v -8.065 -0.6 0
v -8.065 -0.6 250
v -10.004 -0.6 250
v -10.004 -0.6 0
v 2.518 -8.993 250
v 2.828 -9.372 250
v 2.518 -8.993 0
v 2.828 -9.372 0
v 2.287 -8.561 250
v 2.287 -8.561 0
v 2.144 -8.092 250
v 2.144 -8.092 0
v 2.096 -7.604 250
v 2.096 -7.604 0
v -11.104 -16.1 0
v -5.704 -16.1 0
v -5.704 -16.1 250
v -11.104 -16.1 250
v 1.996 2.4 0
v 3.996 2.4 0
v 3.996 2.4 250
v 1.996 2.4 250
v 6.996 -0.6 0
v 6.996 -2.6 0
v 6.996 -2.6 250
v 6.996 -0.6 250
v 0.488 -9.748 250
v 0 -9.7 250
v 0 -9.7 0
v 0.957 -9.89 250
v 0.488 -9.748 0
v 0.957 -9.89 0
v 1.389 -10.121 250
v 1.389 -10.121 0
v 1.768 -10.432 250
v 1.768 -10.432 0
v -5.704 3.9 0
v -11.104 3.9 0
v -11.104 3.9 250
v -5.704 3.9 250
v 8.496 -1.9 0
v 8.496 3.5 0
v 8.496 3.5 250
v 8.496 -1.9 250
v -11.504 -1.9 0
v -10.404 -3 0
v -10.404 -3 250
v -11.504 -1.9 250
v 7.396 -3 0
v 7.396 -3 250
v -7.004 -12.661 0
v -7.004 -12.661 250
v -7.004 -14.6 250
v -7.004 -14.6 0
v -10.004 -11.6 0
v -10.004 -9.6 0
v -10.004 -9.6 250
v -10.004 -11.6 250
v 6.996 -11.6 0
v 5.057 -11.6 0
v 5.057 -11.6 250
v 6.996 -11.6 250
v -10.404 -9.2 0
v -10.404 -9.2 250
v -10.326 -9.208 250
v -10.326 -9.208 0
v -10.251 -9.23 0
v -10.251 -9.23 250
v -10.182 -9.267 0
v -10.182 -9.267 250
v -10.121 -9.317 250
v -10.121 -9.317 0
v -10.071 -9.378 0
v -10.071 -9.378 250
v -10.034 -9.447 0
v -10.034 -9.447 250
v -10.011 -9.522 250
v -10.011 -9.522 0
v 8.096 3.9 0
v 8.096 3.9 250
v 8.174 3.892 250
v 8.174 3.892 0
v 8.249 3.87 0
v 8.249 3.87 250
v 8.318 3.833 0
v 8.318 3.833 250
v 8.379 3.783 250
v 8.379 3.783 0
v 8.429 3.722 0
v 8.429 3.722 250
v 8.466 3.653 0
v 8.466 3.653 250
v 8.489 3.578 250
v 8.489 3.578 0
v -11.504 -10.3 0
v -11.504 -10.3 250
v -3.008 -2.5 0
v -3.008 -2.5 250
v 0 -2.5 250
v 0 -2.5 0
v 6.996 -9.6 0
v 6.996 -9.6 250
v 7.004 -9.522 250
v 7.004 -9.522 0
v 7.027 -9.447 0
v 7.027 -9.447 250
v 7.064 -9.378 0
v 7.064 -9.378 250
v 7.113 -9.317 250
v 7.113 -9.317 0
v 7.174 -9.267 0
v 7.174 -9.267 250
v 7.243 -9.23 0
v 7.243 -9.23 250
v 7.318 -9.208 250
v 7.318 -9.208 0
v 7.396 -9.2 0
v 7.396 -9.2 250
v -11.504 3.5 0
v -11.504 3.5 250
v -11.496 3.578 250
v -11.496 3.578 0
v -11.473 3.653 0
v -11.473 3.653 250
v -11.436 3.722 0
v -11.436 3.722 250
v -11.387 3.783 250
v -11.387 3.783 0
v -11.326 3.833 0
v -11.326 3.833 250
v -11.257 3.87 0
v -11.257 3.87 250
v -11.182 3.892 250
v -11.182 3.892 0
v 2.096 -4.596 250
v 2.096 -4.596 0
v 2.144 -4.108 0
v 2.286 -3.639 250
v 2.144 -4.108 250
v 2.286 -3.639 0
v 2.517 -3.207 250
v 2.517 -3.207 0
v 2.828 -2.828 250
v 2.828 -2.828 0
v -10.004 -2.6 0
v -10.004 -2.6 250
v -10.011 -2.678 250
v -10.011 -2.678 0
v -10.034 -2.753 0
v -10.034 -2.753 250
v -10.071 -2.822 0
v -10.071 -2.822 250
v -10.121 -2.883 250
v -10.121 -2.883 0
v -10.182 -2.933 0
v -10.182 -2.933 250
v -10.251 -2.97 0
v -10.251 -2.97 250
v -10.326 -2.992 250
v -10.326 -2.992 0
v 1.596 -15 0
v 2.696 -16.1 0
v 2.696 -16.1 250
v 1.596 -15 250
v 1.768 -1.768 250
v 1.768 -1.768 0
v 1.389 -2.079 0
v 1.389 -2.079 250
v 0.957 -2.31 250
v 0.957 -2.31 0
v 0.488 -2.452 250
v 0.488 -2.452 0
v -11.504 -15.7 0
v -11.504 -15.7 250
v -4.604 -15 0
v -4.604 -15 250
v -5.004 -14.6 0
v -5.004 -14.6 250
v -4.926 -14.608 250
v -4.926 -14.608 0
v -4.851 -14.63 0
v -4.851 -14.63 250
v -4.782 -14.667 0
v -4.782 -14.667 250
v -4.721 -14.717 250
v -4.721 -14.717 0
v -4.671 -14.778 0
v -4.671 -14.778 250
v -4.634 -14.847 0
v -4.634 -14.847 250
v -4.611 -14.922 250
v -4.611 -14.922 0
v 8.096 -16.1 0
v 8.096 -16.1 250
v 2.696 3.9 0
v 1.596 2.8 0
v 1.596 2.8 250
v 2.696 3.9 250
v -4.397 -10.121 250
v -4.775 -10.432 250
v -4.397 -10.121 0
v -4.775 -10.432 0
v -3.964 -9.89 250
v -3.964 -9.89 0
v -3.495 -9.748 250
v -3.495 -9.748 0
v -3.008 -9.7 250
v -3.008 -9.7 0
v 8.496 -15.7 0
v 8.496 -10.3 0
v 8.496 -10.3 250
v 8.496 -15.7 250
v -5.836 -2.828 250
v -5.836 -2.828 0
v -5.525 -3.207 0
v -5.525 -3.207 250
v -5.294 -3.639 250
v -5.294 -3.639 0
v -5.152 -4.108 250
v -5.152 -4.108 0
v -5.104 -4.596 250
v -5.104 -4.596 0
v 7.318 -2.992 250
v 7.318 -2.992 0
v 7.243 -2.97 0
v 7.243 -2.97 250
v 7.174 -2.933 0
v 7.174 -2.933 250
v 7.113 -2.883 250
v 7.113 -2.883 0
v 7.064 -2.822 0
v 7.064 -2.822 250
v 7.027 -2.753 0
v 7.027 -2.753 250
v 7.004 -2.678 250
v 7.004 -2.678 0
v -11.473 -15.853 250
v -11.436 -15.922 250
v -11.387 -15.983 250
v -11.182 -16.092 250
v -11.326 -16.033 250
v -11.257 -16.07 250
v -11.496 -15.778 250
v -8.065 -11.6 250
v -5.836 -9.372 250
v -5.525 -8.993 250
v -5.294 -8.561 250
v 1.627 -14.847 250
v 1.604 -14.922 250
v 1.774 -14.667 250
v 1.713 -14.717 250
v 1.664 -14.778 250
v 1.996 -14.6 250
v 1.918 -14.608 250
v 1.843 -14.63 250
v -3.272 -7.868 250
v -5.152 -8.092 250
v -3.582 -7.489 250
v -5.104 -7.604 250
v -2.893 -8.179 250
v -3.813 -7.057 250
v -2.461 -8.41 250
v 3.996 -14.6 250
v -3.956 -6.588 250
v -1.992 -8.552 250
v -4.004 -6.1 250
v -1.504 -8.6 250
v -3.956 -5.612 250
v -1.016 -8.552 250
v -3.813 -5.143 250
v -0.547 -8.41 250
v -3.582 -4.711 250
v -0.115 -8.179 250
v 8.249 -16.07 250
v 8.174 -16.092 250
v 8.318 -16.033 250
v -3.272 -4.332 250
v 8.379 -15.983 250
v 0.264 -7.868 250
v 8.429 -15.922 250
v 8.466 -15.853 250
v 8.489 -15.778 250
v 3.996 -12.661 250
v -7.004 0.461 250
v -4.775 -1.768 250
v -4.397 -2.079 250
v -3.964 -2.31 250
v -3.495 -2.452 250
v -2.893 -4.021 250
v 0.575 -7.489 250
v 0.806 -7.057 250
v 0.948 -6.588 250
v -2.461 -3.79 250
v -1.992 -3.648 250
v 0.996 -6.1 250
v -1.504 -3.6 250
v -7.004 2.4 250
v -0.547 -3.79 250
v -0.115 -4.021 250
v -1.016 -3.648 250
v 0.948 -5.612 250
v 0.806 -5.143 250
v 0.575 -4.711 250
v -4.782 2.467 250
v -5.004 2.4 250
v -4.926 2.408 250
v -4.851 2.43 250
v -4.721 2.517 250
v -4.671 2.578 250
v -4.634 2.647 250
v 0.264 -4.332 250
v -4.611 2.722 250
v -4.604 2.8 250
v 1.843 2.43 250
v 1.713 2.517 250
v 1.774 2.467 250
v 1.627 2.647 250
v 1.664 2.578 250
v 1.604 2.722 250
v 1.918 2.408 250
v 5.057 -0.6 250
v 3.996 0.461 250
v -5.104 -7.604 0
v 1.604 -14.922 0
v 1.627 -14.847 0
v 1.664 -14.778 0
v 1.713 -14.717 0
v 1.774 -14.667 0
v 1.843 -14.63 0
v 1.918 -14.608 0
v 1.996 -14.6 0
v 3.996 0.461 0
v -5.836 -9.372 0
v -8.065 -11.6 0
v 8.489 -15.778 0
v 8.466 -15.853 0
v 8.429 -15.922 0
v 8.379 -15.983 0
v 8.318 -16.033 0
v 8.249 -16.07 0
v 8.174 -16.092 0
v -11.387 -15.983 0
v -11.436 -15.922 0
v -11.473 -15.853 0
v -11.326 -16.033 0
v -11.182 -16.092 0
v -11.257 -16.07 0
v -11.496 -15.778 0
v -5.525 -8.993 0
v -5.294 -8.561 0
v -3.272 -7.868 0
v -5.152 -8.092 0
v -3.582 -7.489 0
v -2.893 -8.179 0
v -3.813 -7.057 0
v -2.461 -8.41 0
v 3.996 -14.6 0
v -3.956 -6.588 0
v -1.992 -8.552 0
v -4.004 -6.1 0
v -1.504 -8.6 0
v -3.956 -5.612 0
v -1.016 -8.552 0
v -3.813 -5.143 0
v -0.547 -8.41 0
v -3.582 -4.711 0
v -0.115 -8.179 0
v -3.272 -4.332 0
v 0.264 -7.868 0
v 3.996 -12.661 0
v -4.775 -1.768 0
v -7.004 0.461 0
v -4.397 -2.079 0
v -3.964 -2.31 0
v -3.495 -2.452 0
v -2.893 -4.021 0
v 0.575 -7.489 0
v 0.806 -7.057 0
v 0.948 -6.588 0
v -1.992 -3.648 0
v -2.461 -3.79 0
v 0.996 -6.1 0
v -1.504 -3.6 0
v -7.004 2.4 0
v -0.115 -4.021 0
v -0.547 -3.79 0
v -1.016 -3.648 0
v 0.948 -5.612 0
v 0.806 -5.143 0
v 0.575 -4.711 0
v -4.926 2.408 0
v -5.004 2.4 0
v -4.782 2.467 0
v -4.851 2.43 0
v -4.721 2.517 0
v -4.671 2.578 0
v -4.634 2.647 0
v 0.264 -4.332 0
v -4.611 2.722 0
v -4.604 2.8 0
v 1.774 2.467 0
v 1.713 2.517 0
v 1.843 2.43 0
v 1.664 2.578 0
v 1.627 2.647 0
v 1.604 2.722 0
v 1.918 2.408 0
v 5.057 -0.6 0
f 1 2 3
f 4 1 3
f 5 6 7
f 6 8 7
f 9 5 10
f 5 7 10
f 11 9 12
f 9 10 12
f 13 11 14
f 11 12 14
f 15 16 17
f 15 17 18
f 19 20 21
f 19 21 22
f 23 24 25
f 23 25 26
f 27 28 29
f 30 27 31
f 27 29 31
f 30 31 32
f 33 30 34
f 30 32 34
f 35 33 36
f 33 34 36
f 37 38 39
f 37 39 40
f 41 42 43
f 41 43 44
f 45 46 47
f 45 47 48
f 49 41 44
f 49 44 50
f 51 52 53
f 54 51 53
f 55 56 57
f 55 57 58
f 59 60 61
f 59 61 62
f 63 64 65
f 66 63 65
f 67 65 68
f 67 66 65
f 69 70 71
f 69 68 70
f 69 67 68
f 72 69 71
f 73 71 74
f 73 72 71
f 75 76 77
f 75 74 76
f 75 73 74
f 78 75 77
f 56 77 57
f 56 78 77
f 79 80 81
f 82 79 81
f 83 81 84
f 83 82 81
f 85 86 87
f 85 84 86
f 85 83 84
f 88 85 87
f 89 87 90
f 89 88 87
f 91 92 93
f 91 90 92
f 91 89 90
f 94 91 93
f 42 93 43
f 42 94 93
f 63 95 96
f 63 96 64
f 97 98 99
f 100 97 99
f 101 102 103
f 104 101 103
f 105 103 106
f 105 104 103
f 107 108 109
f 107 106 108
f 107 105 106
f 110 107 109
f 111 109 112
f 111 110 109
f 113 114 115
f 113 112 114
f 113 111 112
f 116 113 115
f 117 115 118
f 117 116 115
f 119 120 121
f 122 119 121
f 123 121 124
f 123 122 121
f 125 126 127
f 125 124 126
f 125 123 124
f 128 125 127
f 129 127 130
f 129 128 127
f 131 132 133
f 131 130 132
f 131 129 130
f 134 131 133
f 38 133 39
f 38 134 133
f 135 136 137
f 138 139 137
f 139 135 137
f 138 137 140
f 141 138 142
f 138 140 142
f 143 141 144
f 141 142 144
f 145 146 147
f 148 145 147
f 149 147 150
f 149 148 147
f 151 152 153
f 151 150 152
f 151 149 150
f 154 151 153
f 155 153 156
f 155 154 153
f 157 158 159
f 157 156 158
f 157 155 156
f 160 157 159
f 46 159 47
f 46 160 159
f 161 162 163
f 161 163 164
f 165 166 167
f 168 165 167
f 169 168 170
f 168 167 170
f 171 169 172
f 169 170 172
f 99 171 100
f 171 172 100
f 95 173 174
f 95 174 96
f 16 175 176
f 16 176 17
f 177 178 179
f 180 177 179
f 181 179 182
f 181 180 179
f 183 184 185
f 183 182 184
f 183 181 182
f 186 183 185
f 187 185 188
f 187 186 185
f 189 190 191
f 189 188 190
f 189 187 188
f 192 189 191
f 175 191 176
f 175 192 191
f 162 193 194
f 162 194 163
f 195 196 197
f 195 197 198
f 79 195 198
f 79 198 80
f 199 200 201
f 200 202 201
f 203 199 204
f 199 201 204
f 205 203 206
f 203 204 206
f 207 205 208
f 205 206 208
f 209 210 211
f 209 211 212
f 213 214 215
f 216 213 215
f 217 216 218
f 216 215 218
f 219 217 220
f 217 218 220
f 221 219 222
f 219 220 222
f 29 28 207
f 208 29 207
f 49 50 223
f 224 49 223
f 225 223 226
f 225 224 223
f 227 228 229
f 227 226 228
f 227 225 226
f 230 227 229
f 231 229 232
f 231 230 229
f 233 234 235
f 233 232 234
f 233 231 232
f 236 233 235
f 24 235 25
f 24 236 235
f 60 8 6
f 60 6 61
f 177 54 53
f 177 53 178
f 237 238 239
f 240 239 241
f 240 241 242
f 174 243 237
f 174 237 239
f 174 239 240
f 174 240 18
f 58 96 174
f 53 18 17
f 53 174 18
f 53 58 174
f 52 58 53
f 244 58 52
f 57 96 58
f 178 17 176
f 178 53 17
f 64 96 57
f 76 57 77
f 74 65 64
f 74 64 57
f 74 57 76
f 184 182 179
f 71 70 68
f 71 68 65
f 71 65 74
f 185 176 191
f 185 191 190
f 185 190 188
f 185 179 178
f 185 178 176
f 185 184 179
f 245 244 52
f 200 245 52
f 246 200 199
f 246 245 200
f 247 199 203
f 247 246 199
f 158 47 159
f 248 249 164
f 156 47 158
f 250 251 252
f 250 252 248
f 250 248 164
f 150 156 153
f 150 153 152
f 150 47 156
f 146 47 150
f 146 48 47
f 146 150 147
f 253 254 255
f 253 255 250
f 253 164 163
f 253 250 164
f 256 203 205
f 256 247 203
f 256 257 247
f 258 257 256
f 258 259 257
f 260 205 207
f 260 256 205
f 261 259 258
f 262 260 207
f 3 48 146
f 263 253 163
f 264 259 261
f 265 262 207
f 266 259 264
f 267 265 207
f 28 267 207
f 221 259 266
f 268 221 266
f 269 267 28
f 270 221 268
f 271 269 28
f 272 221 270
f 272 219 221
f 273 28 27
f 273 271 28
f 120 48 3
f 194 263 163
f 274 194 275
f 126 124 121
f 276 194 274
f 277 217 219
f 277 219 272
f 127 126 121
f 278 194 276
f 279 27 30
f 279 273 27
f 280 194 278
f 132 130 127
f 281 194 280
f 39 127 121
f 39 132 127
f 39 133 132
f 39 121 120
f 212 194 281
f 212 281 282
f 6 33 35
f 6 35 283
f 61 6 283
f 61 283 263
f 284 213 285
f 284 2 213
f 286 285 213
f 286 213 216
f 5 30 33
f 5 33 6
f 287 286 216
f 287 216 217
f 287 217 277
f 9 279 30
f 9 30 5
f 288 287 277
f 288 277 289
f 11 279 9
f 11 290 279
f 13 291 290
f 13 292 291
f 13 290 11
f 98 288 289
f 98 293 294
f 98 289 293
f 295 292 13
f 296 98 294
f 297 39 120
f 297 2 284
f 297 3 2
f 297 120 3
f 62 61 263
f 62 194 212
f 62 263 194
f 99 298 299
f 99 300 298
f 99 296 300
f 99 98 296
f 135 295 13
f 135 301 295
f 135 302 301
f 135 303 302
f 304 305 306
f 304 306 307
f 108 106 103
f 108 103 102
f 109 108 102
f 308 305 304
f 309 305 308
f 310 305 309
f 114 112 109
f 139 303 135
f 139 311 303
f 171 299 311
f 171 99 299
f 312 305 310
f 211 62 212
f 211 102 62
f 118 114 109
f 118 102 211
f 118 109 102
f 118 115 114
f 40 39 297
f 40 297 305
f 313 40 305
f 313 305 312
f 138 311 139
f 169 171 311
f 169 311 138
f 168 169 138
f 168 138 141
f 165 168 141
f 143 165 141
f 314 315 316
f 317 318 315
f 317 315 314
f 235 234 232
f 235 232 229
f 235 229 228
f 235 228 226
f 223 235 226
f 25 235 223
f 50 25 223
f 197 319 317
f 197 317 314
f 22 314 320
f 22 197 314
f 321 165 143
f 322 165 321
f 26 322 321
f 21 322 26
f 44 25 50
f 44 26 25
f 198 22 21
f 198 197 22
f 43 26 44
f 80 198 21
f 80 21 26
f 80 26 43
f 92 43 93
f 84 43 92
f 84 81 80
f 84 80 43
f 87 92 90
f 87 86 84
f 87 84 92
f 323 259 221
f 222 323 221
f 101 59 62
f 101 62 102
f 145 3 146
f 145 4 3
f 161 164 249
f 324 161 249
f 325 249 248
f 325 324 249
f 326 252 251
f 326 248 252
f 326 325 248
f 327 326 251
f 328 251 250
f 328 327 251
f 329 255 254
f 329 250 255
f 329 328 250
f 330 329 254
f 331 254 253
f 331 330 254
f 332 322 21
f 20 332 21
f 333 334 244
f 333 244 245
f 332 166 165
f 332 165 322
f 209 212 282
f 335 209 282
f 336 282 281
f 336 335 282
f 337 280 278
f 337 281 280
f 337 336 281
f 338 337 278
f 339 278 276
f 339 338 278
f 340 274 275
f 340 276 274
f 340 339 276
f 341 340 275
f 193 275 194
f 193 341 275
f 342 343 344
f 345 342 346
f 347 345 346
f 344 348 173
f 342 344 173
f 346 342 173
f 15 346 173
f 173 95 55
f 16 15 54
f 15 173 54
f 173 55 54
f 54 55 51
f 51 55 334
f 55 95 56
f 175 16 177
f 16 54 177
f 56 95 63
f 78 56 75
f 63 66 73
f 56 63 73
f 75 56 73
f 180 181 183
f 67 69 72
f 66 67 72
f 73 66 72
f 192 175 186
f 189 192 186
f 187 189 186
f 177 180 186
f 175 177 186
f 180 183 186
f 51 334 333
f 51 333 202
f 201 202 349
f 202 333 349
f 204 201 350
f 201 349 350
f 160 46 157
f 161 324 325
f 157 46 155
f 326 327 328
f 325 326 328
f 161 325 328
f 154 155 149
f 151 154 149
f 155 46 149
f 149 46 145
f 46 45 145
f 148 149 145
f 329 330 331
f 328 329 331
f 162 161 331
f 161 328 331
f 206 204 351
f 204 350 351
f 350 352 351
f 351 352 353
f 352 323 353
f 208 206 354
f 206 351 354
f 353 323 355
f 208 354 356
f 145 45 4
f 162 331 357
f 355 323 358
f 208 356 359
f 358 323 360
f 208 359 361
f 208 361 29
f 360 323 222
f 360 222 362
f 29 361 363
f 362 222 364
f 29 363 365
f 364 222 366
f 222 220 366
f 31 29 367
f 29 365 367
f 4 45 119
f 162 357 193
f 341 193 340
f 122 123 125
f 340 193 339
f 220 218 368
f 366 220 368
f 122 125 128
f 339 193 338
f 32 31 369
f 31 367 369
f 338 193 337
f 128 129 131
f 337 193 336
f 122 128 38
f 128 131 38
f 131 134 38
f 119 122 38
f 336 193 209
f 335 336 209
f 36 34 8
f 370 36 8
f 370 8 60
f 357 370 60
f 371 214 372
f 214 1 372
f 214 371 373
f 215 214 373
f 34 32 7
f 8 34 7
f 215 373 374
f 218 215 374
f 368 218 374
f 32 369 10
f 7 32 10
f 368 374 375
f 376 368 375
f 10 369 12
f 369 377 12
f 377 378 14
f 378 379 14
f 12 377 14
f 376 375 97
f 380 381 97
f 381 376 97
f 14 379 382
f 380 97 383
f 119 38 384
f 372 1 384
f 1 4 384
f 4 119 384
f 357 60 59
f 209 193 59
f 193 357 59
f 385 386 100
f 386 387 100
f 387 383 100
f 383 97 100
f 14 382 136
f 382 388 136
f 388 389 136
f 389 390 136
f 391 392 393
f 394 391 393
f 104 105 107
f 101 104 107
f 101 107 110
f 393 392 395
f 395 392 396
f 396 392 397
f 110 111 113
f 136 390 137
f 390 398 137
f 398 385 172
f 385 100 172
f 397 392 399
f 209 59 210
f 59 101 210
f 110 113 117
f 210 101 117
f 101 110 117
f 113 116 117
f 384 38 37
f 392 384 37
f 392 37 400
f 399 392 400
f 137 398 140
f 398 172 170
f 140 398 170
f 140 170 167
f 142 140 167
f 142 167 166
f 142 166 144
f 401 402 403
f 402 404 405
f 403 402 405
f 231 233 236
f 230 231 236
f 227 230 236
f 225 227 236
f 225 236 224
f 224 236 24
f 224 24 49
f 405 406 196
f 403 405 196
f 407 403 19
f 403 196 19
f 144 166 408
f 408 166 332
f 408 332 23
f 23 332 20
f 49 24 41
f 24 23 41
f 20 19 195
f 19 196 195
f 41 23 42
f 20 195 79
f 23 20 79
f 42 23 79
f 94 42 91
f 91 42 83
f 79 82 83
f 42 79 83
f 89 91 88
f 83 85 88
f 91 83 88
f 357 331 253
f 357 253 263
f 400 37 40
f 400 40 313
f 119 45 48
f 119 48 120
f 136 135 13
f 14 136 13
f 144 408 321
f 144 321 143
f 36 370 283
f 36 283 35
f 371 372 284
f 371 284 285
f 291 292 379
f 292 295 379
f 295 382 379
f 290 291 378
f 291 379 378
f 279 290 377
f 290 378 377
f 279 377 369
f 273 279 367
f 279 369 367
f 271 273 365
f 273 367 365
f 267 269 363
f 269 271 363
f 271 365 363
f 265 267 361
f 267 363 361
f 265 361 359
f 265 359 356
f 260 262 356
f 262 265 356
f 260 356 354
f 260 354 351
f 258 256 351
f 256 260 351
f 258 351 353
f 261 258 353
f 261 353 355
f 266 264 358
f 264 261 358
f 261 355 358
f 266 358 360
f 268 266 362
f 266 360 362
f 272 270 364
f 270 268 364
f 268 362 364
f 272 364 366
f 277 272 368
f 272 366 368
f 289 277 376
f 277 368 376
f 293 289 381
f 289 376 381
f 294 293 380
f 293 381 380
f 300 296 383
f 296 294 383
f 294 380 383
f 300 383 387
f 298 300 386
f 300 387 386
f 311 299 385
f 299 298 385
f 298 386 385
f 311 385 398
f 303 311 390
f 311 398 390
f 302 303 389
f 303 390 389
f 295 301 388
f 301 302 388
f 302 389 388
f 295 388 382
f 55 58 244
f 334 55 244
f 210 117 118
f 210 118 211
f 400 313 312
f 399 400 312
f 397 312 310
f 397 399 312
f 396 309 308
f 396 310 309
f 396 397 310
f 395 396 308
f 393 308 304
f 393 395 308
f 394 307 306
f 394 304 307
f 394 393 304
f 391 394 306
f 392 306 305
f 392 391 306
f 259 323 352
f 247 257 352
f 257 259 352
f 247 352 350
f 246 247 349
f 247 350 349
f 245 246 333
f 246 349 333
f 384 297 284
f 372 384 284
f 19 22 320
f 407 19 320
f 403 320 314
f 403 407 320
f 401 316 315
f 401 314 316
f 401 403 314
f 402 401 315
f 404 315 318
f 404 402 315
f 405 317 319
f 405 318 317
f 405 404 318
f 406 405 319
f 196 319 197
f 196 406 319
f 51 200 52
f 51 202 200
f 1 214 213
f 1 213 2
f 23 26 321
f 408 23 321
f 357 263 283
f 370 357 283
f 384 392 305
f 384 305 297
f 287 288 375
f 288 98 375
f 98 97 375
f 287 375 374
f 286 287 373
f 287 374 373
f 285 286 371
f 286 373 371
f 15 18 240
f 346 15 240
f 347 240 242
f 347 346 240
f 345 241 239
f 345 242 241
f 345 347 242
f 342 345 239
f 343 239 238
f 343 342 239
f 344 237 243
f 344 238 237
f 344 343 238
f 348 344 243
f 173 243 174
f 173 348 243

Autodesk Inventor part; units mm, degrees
ref_plane "YZ Plane" through (0, 0, 0) normal (1, 0, 0) x (0, 1, 0)
ref_plane "XZ Plane" through (0, 0, 0) normal (0, 1, 0) x (-1, 0, 0)
ref_plane "XY Plane" through (0, 0, 0) normal (0, 0, 1) x (1, 0, 0)
sketch "Sketch1" plane through (0, 0, 0) normal (0, 0, 1) x (1, 0, 0)
  line L0 (1.7678, -1.7678) -> (3.9962, 0.4607) projected
  arc A0 (0, -2.5) -> (1.7678, -1.7678) centre (0, 0) ccw projected
  line L1 (-3.0076, -2.5) -> (0, -2.5) projected
  arc A1 (-4.7754, -1.7678) -> (-3.0076, -2.5) centre (-3.0076, 0) ccw projected
  line L2 (-7.0038, 0.4607) -> (-4.7754, -1.7678) projected
  line L3 (-7.0038, 2.4) -> (-7.0038, 0.4607) projected
  line L4 (-5.0038, 2.4) -> (-7.0038, 2.4) projected
  arc A2 (-5.0038, 2.4) -> (-4.6038, 2.8) centre (-5.0038, 2.8) ccw projected
  line L5 (-5.7038, 3.9) -> (-4.6038, 2.8) projected
  line L6 (-11.1038, 3.9) -> (-5.7038, 3.9) projected
  arc A3 (-11.1038, 3.9) -> (-11.5038, 3.5) centre (-11.1038, 3.5) ccw projected
  line L7 (-11.5038, -1.9) -> (-11.5038, 3.5) projected
  line L8 (-10.4038, -3) -> (-11.5038, -1.9) projected
  arc A4 (-10.4038, -3) -> (-10.0038, -2.6) centre (-10.4038, -2.6) ccw projected
  line L9 (-10.0038, -0.6) -> (-10.0038, -2.6) projected
  line L10 (-8.0645, -0.6) -> (-10.0038, -0.6) projected
  line L11 (-5.836, -2.8284) -> (-8.0645, -0.6) projected
  arc A5 (-5.1038, -4.5962) -> (-5.836, -2.8284) centre (-7.6038, -4.5962) ccw projected
  line L12 (-5.1038, -7.6038) -> (-5.1038, -4.5962) projected
  arc A6 (-5.836, -9.3716) -> (-5.1038, -7.6038) centre (-7.6038, -7.6038) ccw projected
  line L13 (-8.0645, -11.6) -> (-5.836, -9.3716) projected
  line L14 (-10.0038, -11.6) -> (-8.0645, -11.6) projected
  line L15 (-10.0038, -9.6) -> (-10.0038, -11.6) projected
  arc A7 (-10.0038, -9.6) -> (-10.4038, -9.2) centre (-10.4038, -9.6) ccw projected
  line L16 (-11.5038, -10.3) -> (-10.4038, -9.2) projected
  line L17 (-11.5038, -15.7) -> (-11.5038, -10.3) projected
  arc A8 (-11.5038, -15.7) -> (-11.1038, -16.1) centre (-11.1038, -15.7) ccw projected
  line L18 (-5.7038, -16.1) -> (-11.1038, -16.1) projected
  line L19 (-4.6038, -15) -> (-5.7038, -16.1) projected
  arc A9 (-4.6038, -15) -> (-5.0038, -14.6) centre (-5.0038, -15) ccw projected
  line L20 (-7.0038, -14.6) -> (-5.0038, -14.6) projected
  line L21 (-7.0038, -12.6607) -> (-7.0038, -14.6) projected
  line L22 (-4.7754, -10.4322) -> (-7.0038, -12.6607) projected
  arc A10 (-3.0076, -9.7) -> (-4.7754, -10.4322) centre (-3.0076, -12.2) ccw projected
  line L23 (0, -9.7) -> (-3.0076, -9.7) projected
  arc A11 (1.7678, -10.4322) -> (0, -9.7) centre (0, -12.2) ccw projected
  line L24 (3.9962, -12.6607) -> (1.7678, -10.4322) projected
  line L25 (3.9962, -14.6) -> (3.9962, -12.6607) projected
  line L26 (1.9962, -14.6) -> (3.9962, -14.6) projected
  arc A12 (1.9962, -14.6) -> (1.5962, -15) centre (1.9962, -15) ccw projected
  line L27 (2.6962, -16.1) -> (1.5962, -15) projected
  line L28 (8.0962, -16.1) -> (2.6962, -16.1) projected
  arc A13 (8.0962, -16.1) -> (8.4962, -15.7) centre (8.0962, -15.7) ccw projected
  line L29 (8.4962, -10.3) -> (8.4962, -15.7) projected
  line L30 (7.3962, -9.2) -> (8.4962, -10.3) projected
  arc A14 (7.3962, -9.2) -> (6.9962, -9.6) centre (7.3962, -9.6) ccw projected
  line L31 (6.9962, -11.6) -> (6.9962, -9.6) projected
  line L32 (5.0569, -11.6) -> (6.9962, -11.6) projected
  line L33 (2.8284, -9.3716) -> (5.0569, -11.6) projected
  arc A15 (2.0962, -7.6038) -> (2.8284, -9.3716) centre (4.5962, -7.6038) ccw projected
  line L34 (2.0962, -4.5962) -> (2.0962, -7.6038) projected
  arc A16 (2.8284, -2.8284) -> (2.0962, -4.5962) centre (4.5962, -4.5962) ccw projected
  line L35 (5.0569, -0.6) -> (2.8284, -2.8284) projected
  line L36 (6.9962, -0.6) -> (5.0569, -0.6) projected
  line L37 (6.9962, -2.6) -> (6.9962, -0.6) projected
  arc A17 (6.9962, -2.6) -> (7.3962, -3) centre (7.3962, -2.6) ccw projected
  line L38 (8.4962, -1.9) -> (7.3962, -3) projected
  line L39 (8.4962, 3.5) -> (8.4962, -1.9) projected
  arc A18 (8.4962, 3.5) -> (8.0962, 3.9) centre (8.0962, 3.5) ccw projected
  line L40 (2.6962, 3.9) -> (8.0962, 3.9) projected
  line L41 (1.5962, 2.8) -> (2.6962, 3.9) projected
  arc A19 (1.5962, 2.8) -> (1.9962, 2.4) centre (1.9962, 2.8) ccw projected
  line L42 (3.9962, 2.4) -> (1.9962, 2.4) projected
  line L43 (3.9962, 0.4607) -> (3.9962, 2.4) projected
  circle A20 centre (-1.5038, -6.1) radius 2.5 projected
  point P0 (0, 0)
extrude "Extrusion1" add sketch "Sketch1" along normal blind 250
ref_plane "Work Plane1" through (-1.5038, -15.7, 0) normal (-1, 0, 0) x (0, 0, 1)
properties part number "00_VSlot_20mm_200"
